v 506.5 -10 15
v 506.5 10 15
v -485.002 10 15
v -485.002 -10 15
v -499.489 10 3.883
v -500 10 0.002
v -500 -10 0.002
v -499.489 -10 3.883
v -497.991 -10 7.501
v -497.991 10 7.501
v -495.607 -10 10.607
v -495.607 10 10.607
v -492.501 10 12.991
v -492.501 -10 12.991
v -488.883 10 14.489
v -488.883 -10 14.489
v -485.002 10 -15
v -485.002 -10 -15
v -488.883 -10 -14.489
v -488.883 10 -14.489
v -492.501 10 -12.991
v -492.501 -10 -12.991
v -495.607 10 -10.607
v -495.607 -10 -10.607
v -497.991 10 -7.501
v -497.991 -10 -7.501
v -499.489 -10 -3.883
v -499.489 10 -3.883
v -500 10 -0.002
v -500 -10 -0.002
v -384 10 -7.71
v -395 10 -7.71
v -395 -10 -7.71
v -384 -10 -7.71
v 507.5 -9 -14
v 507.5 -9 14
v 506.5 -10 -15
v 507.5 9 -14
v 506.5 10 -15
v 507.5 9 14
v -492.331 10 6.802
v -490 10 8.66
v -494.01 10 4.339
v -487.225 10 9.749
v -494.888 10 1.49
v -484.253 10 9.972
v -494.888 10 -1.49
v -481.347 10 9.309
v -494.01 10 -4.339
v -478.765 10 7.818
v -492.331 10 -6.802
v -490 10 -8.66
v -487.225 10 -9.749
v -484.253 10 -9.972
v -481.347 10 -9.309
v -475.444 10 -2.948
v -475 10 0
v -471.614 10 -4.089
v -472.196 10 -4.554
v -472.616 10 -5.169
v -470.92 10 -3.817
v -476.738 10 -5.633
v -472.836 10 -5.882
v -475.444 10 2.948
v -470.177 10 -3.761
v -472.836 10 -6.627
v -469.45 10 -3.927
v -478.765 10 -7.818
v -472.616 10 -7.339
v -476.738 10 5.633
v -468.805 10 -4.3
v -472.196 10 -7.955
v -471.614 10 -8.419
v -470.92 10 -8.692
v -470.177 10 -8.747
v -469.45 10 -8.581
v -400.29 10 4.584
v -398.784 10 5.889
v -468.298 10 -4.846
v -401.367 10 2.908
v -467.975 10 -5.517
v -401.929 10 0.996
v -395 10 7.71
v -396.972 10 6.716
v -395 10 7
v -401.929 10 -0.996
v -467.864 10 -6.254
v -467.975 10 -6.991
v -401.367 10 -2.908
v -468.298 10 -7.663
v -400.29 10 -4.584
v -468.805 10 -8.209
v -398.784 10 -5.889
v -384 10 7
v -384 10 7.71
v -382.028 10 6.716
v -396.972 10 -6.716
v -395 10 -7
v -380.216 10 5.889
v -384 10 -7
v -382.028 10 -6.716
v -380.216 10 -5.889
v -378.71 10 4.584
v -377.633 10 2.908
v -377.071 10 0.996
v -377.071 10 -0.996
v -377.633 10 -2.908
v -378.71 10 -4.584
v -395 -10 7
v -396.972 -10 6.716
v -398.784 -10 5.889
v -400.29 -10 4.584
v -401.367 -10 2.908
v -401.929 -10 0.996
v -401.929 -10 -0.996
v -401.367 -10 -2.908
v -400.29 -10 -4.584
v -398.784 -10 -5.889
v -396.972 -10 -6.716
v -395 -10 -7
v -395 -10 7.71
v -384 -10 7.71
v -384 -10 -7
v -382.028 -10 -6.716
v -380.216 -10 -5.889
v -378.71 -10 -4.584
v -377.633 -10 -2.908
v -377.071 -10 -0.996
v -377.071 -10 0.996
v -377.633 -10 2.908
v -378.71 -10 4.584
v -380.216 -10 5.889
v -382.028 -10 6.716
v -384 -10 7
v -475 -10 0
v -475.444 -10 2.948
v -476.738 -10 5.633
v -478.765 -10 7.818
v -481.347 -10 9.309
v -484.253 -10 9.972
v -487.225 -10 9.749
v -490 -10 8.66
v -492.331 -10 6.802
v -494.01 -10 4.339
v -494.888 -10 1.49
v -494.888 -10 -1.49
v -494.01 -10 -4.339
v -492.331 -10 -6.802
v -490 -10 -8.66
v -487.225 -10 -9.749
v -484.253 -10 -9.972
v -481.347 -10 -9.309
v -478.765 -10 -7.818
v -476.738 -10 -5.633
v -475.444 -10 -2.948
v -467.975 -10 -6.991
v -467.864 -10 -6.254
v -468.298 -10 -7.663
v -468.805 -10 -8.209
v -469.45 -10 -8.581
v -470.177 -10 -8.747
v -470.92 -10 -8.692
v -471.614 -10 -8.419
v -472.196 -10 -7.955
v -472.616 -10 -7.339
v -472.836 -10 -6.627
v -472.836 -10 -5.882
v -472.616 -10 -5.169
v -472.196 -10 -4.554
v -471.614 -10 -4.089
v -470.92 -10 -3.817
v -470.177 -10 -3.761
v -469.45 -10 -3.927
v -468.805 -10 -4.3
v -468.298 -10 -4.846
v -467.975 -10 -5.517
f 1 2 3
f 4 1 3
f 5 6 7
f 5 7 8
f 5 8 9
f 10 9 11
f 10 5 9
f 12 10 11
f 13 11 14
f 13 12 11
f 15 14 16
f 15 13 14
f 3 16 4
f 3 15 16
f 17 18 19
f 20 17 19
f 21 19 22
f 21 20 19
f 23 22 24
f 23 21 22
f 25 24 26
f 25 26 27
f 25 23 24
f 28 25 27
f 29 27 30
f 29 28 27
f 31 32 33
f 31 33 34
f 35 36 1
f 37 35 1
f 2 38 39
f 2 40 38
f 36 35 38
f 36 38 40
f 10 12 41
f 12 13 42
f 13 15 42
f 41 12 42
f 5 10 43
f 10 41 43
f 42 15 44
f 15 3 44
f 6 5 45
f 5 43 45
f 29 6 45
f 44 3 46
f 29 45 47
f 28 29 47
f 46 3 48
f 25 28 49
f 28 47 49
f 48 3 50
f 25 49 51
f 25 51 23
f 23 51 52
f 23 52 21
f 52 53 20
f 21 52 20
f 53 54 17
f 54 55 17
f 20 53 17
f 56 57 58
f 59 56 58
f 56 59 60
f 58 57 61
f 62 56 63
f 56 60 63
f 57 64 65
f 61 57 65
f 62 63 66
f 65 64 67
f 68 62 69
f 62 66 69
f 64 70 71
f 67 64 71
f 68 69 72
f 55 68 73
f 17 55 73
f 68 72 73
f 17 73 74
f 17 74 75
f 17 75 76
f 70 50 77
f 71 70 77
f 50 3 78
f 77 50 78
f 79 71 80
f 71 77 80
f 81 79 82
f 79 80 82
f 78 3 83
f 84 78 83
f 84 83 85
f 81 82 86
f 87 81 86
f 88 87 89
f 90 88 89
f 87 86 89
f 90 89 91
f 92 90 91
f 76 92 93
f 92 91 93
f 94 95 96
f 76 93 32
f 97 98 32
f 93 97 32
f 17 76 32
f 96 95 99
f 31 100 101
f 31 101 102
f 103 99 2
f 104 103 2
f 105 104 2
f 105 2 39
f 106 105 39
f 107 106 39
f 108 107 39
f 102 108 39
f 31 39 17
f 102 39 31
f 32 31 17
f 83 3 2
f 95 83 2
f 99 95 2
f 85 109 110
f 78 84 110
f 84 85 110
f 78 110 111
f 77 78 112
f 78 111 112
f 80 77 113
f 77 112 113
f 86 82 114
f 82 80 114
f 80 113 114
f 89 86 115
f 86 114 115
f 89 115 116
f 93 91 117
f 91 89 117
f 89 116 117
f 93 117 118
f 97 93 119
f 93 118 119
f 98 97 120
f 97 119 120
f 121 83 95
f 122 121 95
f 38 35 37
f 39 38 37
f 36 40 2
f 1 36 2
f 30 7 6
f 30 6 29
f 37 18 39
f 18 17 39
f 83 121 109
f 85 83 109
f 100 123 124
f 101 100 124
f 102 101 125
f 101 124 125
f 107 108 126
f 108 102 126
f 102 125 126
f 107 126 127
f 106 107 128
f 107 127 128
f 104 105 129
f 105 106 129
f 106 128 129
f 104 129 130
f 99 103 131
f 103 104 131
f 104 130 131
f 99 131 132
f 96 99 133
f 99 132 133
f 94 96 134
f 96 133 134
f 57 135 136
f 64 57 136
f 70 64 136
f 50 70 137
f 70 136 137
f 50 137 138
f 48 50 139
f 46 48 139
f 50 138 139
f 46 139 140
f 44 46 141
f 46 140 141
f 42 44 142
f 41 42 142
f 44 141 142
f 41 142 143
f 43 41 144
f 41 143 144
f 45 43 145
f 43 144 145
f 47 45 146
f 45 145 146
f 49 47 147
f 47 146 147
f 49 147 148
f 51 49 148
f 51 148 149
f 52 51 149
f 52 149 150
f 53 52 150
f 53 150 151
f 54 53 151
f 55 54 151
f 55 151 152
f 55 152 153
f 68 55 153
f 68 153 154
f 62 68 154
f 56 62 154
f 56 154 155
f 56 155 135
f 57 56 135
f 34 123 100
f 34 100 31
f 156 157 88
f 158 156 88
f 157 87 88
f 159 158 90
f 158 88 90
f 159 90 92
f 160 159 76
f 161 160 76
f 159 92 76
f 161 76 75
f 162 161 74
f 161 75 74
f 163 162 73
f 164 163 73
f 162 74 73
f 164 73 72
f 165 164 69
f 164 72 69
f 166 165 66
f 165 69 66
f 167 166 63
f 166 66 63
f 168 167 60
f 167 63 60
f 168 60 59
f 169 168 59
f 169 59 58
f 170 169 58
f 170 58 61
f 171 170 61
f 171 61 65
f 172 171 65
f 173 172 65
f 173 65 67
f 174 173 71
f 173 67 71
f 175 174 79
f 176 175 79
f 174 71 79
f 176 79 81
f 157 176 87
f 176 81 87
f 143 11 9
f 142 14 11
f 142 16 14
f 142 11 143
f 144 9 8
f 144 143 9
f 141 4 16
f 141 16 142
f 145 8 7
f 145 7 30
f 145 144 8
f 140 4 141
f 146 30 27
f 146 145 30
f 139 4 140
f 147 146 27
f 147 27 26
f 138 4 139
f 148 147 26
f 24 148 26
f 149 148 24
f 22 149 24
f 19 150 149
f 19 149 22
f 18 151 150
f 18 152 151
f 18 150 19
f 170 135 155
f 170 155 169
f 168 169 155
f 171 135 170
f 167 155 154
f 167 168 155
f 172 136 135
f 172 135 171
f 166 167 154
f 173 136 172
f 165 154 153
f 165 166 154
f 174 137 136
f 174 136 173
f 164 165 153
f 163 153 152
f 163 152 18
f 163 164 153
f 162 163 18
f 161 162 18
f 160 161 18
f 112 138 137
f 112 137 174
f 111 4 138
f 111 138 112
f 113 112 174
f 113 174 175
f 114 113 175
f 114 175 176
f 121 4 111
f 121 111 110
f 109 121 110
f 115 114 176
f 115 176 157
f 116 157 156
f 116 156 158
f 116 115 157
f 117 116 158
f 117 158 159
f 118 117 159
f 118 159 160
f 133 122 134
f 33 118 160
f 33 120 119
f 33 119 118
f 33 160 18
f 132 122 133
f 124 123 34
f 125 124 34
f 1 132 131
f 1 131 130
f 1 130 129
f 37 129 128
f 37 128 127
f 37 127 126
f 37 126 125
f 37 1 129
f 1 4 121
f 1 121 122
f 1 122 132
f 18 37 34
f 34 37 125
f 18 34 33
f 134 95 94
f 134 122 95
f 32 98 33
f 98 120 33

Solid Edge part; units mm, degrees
sketch "Sketch1" plane through (0, 0, 0) normal (0, -1, 0) x (1, 0, 0)
  line L0 (-500, -15) -> (500, -15)
  line L1 (500, -15) -> (500, 15)
  line L2 (500, 15) -> (-500, 15)
  line L3 (-500, 15) -> (-500, -15)
extrude "Protrusion1" add sketch "Sketch1" along normal mid plane 20
fillet "Round_1" radius 15 2 edges at (-500, 0, 15) (-500, 0, -15)
sketch "Sketch2" plane through (0, -10, 0) normal (0, -1, 0) x (1, 0, 0)
  circle A0 centre (-485, 0) radius 10
extrude "ExtrudedCutout_1" cut sketch "Sketch2" against normal blind 60
sketch "Sketch3" plane through (0, -10, 0) normal (0, -1, 0) x (1, 0, 0)
  line L0 (-395, 7) -> (-384, 7)
  line L1 (-384, -7) -> (-395, -7)
  arc A0 (-384, 7) -> (-384, -7) centre (-384, 0) cw
  arc A1 (-395, -7) -> (-395, 7) centre (-395, 0) cw
extrude "ExtrudedCutout_2" cut sketch "Sketch3" against normal blind 20
sketch "Sketch4" plane through (0, -10, 0) normal (0, -1, 0) x (1, 0, 0)
  line L0 (-395, 7.71) -> (-384, 7.71)
  line L1 (-384, 7.71) -> (-384, -7.71)
  line L2 (-395, -7.71) -> (-384, -7.71)
  line L3 (-395, 7.71) -> (-395, -7.71)
extrude "ExtrudedCutout_3" cut sketch "Sketch4" against normal blind 20
sketch "Sketch5" plane through (0, 10, 0) normal (0, 1, 0) x (1, 0, 0)
  circle A0 centre (-470.3635, 6.2542) radius 2.5
extrude "ExtrudedCutout_6" cut sketch "Sketch5" against normal blind 20
sketch "Sketch6" plane through (-0.5, -10, 0) normal (0, -1, 0) x (-1, 0, 0)
  line L0 (-499.5, 15) -> (-500.5, 15)
  line L1 (-500.5, 15) -> (-500.5, 14)
  line L2 (-500.5, 14) -> (-499.5, 15)
  line L3 (-500.5, -14) -> (-500.5, -15)
  line L4 (-500.5, -15) -> (-499.5, -15)
  line L5 (-499.5, -15) -> (-500.5, -14)
extrude "ExtrudedCutout_8" cut sketch "Sketch6" along normal mid plane 240
sketch "Sketch7" plane through (500, 0, 0) normal (1, 0, 0) x (0, 0, -1)
  line L0 (-15, -10) -> (15, -10)
  line L1 (15, -10) -> (15, 10)
  line L2 (15, 10) -> (-15, 10)
  line L3 (-15, 10) -> (-15, -10)
extrude "ExtrudedProtrusion_2" add sketch "Sketch7" along normal mid plane 15
sketch "Sketch8" plane through (11.25, 0, -15) normal (0, 0, -1) x (-1, 0, 0)
  line L0 (-495.25, 10) -> (-496.25, 10)
  line L1 (-496.25, 10) -> (-496.25, 9)
  line L2 (-496.25, 9) -> (-495.25, 10)
  line L3 (-495.25, -10) -> (-496.25, -10)
  line L4 (-496.25, -10) -> (-496.25, -9)
  line L5 (-496.25, -9) -> (-495.25, -10)
extrude "ExtrudedCutout_9" cut sketch "Sketch8" along normal mid plane 80
sketch "Sketch9" plane through (3.25, -10, 0) normal (0, -1, 0) x (-1, 0, 0)
  line L0 (-504.25, 15) -> (-504.25, 14)
  line L1 (-504.25, 14) -> (-503.25, 15)
  line L2 (-503.25, 15) -> (-504.25, 15)
  line L3 (-504.25, -15) -> (-504.25, -14)
  line L4 (-504.25, -14) -> (-503.25, -15)
  line L5 (-503.25, -15) -> (-504.25, -15)
extrude "ExtrudedCutout_10" cut sketch "Sketch9" along normal mid plane 40
properties material "Steel - Stainless:1.4301 , X5CrNi18-10"
